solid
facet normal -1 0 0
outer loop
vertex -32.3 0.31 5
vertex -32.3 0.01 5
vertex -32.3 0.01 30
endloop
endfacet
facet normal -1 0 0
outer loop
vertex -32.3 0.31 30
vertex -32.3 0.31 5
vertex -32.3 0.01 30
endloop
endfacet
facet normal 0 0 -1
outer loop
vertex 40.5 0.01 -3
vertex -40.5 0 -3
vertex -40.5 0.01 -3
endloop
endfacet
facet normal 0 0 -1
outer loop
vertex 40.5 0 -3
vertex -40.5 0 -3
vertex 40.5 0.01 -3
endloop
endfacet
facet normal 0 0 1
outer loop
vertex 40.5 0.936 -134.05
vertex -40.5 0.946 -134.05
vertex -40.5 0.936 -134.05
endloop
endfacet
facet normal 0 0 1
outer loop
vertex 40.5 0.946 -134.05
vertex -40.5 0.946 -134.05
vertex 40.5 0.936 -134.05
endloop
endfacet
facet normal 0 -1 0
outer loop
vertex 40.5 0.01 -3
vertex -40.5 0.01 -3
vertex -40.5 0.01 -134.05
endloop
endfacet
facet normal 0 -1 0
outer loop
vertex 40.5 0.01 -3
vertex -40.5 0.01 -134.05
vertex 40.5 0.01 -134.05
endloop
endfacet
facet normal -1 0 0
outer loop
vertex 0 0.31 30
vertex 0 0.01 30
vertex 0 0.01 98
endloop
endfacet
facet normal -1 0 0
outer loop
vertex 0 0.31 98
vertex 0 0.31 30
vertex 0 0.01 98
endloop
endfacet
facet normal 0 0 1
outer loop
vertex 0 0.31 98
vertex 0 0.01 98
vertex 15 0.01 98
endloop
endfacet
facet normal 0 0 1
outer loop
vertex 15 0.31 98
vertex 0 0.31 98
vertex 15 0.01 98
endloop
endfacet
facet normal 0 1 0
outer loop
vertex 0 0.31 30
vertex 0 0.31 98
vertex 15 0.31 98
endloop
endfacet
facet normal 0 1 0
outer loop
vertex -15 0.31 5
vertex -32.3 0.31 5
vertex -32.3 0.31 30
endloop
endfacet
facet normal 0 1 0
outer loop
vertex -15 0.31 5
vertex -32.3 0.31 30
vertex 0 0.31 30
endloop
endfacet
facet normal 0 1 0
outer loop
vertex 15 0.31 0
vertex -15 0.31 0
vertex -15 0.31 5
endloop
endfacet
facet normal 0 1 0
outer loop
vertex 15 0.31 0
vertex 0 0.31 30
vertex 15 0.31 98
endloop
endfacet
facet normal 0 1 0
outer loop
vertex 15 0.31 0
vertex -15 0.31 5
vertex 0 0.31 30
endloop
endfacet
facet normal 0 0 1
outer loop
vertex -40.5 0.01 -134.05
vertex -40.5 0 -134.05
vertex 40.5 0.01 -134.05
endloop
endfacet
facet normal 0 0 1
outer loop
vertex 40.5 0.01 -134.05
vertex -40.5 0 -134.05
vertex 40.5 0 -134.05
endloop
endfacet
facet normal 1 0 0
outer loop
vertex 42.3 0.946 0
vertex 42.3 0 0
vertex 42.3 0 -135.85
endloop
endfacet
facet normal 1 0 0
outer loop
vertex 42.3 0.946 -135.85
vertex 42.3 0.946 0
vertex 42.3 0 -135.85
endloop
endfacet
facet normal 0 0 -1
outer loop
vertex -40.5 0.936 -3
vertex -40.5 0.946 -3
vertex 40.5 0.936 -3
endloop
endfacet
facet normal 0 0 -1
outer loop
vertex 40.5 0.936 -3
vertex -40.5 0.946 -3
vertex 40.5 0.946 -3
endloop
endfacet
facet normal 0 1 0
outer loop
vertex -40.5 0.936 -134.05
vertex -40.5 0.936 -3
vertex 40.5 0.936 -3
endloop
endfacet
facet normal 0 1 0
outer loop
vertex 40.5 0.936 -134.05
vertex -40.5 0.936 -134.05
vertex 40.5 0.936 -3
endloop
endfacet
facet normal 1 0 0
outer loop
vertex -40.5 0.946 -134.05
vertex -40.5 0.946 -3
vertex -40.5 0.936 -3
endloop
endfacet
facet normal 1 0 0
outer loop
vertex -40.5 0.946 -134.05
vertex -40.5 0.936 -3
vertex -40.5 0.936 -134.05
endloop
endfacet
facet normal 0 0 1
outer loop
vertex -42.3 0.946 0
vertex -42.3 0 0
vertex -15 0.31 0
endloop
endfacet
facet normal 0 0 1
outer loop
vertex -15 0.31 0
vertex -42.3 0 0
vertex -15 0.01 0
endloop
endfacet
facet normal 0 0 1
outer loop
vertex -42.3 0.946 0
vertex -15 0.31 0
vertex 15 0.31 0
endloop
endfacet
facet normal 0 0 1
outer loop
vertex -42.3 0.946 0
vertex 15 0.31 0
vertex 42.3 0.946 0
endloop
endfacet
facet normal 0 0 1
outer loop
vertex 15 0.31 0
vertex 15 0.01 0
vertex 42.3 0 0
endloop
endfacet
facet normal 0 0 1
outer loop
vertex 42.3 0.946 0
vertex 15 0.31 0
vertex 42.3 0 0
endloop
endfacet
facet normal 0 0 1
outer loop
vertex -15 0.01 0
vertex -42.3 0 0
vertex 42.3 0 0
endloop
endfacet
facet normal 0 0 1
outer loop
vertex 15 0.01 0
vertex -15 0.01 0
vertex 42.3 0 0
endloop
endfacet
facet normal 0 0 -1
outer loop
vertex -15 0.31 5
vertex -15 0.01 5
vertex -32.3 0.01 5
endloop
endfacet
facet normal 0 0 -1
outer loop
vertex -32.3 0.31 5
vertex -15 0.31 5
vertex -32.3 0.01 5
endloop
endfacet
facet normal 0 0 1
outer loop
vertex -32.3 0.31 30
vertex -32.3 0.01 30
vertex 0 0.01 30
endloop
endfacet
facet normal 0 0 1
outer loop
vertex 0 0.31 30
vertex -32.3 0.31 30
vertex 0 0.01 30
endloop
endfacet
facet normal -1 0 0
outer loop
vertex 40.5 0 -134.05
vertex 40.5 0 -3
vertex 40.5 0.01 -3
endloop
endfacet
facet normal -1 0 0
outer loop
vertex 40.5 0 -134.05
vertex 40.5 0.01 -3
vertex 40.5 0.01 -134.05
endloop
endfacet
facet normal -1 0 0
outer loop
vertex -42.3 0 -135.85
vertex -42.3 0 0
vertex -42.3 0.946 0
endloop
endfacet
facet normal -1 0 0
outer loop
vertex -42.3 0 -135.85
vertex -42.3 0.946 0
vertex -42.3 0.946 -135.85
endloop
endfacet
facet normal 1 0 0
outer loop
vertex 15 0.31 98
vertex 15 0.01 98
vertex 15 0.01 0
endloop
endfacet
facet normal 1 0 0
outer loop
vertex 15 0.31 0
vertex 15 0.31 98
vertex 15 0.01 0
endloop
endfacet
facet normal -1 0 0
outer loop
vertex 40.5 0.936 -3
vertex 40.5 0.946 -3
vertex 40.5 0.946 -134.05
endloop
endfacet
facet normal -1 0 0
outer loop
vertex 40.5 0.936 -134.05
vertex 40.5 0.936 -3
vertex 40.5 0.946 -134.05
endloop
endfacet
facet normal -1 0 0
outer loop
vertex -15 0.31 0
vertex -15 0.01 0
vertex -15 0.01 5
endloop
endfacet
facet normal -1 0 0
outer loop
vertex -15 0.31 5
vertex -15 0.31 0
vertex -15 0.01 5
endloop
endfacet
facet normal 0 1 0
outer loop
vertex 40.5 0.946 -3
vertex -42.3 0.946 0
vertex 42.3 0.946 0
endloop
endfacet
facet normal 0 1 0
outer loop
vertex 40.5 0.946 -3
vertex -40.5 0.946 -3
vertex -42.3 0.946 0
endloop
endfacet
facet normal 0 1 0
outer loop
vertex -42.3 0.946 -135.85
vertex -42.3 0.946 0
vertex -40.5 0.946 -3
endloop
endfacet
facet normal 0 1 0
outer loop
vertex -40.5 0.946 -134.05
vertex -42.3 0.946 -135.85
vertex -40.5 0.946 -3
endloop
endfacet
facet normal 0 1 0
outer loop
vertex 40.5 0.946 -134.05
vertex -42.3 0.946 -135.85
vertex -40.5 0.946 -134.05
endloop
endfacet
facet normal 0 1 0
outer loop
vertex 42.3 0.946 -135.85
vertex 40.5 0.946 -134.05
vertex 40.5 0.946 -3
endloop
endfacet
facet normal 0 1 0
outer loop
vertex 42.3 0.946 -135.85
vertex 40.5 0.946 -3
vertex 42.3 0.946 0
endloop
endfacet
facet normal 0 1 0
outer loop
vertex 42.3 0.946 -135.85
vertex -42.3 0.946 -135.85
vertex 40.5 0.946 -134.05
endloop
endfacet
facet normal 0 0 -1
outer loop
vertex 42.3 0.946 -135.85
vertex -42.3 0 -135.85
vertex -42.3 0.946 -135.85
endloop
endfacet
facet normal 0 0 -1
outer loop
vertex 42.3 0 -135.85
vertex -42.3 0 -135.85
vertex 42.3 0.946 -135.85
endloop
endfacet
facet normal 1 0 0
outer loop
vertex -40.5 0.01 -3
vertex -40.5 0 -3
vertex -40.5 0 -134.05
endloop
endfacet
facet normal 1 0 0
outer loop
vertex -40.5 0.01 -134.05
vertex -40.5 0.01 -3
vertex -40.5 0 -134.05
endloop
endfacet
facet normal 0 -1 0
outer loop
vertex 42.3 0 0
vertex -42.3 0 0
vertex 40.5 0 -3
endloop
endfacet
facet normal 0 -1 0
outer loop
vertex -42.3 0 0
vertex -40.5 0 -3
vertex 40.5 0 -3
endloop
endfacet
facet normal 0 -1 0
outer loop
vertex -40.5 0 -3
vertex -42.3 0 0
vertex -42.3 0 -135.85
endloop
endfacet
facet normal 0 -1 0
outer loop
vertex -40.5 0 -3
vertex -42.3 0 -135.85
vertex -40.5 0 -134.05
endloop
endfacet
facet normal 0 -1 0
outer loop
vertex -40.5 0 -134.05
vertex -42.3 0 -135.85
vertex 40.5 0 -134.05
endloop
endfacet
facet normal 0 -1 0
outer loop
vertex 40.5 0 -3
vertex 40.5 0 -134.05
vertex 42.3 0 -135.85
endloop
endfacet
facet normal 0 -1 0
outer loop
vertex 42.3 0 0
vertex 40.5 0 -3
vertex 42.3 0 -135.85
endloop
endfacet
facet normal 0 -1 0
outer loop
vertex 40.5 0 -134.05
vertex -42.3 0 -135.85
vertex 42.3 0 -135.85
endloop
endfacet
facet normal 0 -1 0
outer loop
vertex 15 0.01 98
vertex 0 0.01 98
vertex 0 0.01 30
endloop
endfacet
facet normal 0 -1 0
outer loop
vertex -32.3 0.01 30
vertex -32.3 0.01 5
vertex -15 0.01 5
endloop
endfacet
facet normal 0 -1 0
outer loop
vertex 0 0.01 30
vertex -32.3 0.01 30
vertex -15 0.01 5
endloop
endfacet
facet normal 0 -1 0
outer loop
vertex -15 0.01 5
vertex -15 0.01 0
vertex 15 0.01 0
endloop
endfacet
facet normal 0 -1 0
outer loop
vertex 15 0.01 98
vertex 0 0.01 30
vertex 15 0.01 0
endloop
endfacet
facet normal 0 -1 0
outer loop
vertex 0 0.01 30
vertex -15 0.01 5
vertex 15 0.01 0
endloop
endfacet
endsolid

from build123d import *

# Parameters (mm, degrees)
SKETCH1_W           = 84.6
SKETCH1_H           = 135.85
BOSS_EXTRUDE1_DEPTH = 0.946
BOSS_EXTRUDE2_START = 0.01
BOSS_EXTRUDE2_DEPTH = 0.3
SKETCH3_W           = 81
SKETCH3_H           = 131.05
CUT_EXTRUDE1_DEPTH  = 0.01
CUT_EXTRUDE3_START  = -0.946
SKETCH3_2_W         = 81
SKETCH3_2_H         = 131.05
CUT_EXTRUDE3_DEPTH  = 0.01


with BuildPart() as part:
    # Sketch1 → Boss-Extrude1 (new body)
    with BuildSketch(Plane(origin=(0, 0, 0), x_dir=(1, 0, 0), z_dir=(0, 1, 0))):
        with Locations((0, 67.925)):
            Rectangle(SKETCH1_W, SKETCH1_H)
    extrude(amount=BOSS_EXTRUDE1_DEPTH)

    # Sketch2 → Boss-Extrude2 (add)
    with BuildSketch(Plane(origin=(0, 0, 0), x_dir=(1, 0, 0), z_dir=(0, 1, 0)).offset(BOSS_EXTRUDE2_START)):
        Polygon((-15, 0), (-15, -5), (-32.3, -5), (-32.3, -30), (0, -30), (0, -98), (15, -98), (15, 0), align=None)
    extrude(amount=BOSS_EXTRUDE2_DEPTH)

    # Sketch3 → Cut-Extrude1 (cut)
    with BuildSketch(Plane(origin=(0, 0.946, 0), x_dir=(1, 0, 0), z_dir=(0, 1, 0))):
        with Locations((0, 68.525)):
            Rectangle(SKETCH3_W, SKETCH3_H)
    extrude(amount=-CUT_EXTRUDE1_DEPTH, mode=Mode.SUBTRACT)

    # Sketch3<2> → Cut-Extrude3 (cut)
    with BuildSketch(Plane(origin=(0, 0.946, 0), x_dir=(1, 0, 0), z_dir=(0, 1, 0)).offset(CUT_EXTRUDE3_START)):
        with Locations((0, 68.525)):
            Rectangle(SKETCH3_2_W, SKETCH3_2_H)
    extrude(amount=CUT_EXTRUDE3_DEPTH, mode=Mode.SUBTRACT)


solid = part.part
